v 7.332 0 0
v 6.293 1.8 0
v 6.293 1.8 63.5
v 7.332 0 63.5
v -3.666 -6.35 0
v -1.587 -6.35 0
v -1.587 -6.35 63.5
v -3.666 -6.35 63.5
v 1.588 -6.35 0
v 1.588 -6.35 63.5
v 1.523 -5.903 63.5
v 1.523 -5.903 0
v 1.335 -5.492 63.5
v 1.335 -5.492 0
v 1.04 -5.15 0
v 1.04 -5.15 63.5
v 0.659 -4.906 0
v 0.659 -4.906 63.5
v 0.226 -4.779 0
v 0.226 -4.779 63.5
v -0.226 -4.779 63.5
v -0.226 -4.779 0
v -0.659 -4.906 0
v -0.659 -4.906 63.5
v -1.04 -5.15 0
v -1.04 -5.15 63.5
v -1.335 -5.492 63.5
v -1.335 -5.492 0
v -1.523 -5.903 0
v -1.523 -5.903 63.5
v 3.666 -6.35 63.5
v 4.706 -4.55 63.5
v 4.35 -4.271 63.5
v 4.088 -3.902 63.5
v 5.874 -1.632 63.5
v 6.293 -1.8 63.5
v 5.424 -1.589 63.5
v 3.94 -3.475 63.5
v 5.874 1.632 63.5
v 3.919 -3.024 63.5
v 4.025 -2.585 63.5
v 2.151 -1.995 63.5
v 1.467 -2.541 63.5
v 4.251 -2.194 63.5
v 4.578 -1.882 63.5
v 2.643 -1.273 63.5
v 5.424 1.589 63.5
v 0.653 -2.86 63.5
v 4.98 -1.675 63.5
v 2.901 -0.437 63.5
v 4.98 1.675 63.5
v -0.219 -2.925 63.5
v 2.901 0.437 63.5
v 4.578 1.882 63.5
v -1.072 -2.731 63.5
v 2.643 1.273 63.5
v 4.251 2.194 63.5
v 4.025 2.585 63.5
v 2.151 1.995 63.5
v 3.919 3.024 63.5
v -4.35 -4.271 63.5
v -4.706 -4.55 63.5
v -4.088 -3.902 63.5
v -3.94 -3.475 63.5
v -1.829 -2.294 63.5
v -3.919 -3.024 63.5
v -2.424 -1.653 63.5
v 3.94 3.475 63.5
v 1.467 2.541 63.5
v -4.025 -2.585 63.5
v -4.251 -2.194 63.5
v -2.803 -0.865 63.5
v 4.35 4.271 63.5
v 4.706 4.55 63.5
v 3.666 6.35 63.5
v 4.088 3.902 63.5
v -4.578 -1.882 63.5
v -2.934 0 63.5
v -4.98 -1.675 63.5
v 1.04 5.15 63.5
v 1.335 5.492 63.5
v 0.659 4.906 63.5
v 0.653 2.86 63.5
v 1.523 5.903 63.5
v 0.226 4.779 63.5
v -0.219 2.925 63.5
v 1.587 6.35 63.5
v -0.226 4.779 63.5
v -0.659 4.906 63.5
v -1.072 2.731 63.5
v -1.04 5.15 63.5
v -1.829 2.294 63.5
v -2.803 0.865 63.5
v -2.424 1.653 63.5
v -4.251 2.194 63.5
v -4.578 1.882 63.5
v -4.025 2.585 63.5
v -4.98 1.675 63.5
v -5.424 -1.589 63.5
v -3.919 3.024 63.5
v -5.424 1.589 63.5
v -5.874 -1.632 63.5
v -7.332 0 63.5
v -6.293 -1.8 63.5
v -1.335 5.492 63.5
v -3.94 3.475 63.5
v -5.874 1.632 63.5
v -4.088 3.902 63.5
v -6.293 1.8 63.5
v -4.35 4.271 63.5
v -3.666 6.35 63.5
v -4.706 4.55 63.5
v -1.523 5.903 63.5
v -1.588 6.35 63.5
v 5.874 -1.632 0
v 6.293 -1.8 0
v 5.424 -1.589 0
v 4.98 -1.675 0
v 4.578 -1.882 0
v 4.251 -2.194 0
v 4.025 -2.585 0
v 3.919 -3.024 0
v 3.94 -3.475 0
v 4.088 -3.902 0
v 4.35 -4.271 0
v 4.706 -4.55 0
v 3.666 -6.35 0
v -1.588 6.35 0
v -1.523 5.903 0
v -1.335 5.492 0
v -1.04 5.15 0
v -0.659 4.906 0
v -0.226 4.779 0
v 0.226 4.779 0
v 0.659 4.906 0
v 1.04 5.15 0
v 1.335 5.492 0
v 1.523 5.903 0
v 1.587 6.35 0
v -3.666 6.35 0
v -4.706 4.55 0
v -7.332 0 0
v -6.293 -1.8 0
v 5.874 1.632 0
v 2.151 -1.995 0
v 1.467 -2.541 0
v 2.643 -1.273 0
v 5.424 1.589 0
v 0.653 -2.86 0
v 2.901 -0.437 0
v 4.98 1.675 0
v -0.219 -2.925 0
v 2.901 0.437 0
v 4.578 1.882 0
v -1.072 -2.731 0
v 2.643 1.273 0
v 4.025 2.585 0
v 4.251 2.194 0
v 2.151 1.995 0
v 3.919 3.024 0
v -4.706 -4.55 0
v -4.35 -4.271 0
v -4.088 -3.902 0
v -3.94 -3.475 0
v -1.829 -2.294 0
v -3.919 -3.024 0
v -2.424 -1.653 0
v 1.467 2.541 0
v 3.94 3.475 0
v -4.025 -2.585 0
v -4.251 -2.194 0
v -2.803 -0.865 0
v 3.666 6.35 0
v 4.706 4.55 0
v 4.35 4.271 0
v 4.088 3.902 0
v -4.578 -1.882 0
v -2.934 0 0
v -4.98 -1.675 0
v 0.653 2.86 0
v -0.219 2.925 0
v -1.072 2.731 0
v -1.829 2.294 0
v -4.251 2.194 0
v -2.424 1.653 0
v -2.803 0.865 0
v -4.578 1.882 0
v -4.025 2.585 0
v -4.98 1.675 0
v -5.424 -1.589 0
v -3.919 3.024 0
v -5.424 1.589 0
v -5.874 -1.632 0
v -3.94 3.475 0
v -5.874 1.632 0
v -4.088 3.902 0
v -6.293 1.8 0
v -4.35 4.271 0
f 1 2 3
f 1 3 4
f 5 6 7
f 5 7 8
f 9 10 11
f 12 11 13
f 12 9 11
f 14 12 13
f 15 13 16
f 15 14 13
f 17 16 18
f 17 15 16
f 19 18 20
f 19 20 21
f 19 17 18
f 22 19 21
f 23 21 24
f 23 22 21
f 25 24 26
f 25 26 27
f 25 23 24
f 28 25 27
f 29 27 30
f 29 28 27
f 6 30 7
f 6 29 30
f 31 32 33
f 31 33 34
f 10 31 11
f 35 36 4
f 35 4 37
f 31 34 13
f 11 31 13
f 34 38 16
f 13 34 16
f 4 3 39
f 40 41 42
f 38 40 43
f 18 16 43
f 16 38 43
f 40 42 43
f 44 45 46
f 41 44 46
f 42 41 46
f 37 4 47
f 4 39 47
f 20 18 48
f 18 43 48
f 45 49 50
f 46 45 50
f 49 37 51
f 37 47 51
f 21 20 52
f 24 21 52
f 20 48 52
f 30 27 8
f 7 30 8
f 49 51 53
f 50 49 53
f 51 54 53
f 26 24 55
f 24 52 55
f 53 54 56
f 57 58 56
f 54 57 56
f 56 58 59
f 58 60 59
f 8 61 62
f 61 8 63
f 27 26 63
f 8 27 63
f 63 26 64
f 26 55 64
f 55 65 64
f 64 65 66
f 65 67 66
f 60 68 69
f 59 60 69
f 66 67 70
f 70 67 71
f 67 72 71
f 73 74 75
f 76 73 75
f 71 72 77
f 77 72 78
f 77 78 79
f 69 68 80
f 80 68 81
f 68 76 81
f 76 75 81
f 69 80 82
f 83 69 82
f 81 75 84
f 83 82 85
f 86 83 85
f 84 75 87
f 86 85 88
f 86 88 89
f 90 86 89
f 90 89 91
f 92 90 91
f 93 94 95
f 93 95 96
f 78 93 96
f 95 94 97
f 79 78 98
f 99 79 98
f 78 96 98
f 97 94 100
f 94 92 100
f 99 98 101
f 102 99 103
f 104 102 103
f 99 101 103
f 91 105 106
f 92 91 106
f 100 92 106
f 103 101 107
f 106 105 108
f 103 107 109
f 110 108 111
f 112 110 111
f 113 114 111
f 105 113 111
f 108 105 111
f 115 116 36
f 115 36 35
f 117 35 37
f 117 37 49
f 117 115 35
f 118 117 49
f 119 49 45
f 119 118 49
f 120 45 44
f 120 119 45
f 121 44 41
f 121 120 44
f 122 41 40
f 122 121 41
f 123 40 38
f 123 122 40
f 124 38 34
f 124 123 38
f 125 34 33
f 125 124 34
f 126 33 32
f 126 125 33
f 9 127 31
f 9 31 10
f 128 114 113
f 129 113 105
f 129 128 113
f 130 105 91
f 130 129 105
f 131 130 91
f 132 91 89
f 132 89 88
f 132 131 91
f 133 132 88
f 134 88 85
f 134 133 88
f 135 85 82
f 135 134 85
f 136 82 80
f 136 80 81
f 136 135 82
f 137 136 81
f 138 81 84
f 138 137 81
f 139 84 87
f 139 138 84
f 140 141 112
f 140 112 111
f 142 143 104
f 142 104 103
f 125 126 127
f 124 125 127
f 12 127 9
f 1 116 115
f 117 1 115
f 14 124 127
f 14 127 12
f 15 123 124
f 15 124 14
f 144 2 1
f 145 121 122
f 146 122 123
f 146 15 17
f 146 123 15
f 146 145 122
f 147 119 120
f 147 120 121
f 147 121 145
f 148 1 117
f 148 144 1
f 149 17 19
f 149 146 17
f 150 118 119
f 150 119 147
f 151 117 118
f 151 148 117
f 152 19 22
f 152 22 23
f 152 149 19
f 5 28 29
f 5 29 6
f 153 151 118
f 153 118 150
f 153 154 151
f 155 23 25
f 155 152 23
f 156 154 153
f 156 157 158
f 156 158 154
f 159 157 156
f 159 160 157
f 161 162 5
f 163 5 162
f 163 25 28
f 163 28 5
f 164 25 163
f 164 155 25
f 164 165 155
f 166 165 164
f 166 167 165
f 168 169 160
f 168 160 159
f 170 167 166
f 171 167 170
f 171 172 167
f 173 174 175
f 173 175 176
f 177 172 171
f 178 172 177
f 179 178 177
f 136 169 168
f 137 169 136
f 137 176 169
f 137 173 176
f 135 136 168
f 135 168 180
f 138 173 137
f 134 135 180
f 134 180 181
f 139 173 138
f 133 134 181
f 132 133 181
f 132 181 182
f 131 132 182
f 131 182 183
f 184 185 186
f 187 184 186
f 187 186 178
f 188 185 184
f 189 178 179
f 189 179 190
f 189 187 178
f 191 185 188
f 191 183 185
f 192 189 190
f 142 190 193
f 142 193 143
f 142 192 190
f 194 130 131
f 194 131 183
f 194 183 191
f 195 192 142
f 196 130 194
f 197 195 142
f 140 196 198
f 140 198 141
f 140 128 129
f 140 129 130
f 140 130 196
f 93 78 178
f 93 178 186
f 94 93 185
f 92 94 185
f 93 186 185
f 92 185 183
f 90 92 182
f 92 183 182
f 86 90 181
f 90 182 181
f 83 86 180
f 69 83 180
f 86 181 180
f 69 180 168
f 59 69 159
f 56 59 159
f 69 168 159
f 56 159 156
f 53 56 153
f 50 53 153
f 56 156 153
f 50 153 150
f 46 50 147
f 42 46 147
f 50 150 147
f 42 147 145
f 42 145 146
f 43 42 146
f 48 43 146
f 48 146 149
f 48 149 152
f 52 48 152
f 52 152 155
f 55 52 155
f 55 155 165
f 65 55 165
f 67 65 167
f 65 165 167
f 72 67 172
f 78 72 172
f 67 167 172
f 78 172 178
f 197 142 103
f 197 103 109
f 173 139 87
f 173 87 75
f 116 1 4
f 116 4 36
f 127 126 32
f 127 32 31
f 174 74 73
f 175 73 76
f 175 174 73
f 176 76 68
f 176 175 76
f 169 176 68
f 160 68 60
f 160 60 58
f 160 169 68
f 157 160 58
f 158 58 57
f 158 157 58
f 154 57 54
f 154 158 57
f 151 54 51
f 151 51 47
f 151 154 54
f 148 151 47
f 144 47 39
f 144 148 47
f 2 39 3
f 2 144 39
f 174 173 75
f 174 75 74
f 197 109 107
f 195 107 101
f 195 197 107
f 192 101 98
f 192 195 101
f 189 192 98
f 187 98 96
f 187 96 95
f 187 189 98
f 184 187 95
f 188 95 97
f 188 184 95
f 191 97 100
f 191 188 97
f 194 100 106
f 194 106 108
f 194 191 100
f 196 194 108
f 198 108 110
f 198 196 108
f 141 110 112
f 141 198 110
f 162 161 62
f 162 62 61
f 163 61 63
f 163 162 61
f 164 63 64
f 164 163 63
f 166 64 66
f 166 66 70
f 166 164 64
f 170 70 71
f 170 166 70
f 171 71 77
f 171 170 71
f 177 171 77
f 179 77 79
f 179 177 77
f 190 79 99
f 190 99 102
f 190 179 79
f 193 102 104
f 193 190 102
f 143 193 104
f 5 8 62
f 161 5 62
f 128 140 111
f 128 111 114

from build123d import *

# Parameters (mm, degrees)
SKETCH1_R           = 2.9337
BOSS_EXTRUDE1_DEPTH = 63.5


with BuildPart() as part:
    # Sketch1 → Boss-Extrude1 (new body)
    with BuildSketch(Plane(origin=(0, 0, 0), x_dir=(-1, 0, 0), z_dir=(0, 0, -1))):
        with BuildLine():
            Line((-7.332348419, 4.44e-07), (-6.293011423, -1.80018429))
            ThreePointArc((-6.293011423, -1.80018429), (-4.12444613, -2.38124975), (-4.70551159, -4.549815043))
            Line((-4.70551159, -4.549815043), (-3.666174594, -6.349999778))
            Line((-3.666174594, -6.349999778), (-1.587500385, -6.349999778))
            ThreePointArc((-1.587500385, -6.349999778), (-3.85e-07, -4.762499778), (1.587499615, -6.349999778))
            Line((1.587499615, -6.349999778), (3.666173825, -6.349999778))
            Line((3.666173825, -6.349999778), (4.705510929, -4.549815106))
            ThreePointArc((4.705510929, -4.549815106), (4.124445601, -2.381249778), (6.293010929, -1.800184449))
            Line((6.293010929, -1.800184449), (7.332348034, 2.22e-07))
            Line((7.332348034, 2.22e-07), (6.293011189, 1.800184821))
            ThreePointArc((6.293011189, 1.800184821), (4.124445913, 2.381250347), (4.705511439, 4.549815623))
            Line((4.705511439, 4.549815623), (3.666174594, 6.350000222))
            Line((3.666174594, 6.350000222), (1.587500385, 6.350000222))
            ThreePointArc((1.587500385, 6.350000222), (3.85e-07, 4.762500222), (-1.587499615, 6.350000222))
            Line((-1.587499615, 6.350000222), (-3.666173825, 6.350000222))
            Line((-3.666173825, 6.350000222), (-4.705511038, 4.549815614))
            ThreePointArc((-4.705511038, 4.549815614), (-4.124445841, 2.38125025), (-6.293011205, 1.800185053))
            Line((-6.293011205, 1.800185053), (-7.332348419, 4.44e-07))
        make_face()
        Circle(SKETCH1_R, mode=Mode.SUBTRACT)
    extrude(amount=-BOSS_EXTRUDE1_DEPTH)


solid = part.part
